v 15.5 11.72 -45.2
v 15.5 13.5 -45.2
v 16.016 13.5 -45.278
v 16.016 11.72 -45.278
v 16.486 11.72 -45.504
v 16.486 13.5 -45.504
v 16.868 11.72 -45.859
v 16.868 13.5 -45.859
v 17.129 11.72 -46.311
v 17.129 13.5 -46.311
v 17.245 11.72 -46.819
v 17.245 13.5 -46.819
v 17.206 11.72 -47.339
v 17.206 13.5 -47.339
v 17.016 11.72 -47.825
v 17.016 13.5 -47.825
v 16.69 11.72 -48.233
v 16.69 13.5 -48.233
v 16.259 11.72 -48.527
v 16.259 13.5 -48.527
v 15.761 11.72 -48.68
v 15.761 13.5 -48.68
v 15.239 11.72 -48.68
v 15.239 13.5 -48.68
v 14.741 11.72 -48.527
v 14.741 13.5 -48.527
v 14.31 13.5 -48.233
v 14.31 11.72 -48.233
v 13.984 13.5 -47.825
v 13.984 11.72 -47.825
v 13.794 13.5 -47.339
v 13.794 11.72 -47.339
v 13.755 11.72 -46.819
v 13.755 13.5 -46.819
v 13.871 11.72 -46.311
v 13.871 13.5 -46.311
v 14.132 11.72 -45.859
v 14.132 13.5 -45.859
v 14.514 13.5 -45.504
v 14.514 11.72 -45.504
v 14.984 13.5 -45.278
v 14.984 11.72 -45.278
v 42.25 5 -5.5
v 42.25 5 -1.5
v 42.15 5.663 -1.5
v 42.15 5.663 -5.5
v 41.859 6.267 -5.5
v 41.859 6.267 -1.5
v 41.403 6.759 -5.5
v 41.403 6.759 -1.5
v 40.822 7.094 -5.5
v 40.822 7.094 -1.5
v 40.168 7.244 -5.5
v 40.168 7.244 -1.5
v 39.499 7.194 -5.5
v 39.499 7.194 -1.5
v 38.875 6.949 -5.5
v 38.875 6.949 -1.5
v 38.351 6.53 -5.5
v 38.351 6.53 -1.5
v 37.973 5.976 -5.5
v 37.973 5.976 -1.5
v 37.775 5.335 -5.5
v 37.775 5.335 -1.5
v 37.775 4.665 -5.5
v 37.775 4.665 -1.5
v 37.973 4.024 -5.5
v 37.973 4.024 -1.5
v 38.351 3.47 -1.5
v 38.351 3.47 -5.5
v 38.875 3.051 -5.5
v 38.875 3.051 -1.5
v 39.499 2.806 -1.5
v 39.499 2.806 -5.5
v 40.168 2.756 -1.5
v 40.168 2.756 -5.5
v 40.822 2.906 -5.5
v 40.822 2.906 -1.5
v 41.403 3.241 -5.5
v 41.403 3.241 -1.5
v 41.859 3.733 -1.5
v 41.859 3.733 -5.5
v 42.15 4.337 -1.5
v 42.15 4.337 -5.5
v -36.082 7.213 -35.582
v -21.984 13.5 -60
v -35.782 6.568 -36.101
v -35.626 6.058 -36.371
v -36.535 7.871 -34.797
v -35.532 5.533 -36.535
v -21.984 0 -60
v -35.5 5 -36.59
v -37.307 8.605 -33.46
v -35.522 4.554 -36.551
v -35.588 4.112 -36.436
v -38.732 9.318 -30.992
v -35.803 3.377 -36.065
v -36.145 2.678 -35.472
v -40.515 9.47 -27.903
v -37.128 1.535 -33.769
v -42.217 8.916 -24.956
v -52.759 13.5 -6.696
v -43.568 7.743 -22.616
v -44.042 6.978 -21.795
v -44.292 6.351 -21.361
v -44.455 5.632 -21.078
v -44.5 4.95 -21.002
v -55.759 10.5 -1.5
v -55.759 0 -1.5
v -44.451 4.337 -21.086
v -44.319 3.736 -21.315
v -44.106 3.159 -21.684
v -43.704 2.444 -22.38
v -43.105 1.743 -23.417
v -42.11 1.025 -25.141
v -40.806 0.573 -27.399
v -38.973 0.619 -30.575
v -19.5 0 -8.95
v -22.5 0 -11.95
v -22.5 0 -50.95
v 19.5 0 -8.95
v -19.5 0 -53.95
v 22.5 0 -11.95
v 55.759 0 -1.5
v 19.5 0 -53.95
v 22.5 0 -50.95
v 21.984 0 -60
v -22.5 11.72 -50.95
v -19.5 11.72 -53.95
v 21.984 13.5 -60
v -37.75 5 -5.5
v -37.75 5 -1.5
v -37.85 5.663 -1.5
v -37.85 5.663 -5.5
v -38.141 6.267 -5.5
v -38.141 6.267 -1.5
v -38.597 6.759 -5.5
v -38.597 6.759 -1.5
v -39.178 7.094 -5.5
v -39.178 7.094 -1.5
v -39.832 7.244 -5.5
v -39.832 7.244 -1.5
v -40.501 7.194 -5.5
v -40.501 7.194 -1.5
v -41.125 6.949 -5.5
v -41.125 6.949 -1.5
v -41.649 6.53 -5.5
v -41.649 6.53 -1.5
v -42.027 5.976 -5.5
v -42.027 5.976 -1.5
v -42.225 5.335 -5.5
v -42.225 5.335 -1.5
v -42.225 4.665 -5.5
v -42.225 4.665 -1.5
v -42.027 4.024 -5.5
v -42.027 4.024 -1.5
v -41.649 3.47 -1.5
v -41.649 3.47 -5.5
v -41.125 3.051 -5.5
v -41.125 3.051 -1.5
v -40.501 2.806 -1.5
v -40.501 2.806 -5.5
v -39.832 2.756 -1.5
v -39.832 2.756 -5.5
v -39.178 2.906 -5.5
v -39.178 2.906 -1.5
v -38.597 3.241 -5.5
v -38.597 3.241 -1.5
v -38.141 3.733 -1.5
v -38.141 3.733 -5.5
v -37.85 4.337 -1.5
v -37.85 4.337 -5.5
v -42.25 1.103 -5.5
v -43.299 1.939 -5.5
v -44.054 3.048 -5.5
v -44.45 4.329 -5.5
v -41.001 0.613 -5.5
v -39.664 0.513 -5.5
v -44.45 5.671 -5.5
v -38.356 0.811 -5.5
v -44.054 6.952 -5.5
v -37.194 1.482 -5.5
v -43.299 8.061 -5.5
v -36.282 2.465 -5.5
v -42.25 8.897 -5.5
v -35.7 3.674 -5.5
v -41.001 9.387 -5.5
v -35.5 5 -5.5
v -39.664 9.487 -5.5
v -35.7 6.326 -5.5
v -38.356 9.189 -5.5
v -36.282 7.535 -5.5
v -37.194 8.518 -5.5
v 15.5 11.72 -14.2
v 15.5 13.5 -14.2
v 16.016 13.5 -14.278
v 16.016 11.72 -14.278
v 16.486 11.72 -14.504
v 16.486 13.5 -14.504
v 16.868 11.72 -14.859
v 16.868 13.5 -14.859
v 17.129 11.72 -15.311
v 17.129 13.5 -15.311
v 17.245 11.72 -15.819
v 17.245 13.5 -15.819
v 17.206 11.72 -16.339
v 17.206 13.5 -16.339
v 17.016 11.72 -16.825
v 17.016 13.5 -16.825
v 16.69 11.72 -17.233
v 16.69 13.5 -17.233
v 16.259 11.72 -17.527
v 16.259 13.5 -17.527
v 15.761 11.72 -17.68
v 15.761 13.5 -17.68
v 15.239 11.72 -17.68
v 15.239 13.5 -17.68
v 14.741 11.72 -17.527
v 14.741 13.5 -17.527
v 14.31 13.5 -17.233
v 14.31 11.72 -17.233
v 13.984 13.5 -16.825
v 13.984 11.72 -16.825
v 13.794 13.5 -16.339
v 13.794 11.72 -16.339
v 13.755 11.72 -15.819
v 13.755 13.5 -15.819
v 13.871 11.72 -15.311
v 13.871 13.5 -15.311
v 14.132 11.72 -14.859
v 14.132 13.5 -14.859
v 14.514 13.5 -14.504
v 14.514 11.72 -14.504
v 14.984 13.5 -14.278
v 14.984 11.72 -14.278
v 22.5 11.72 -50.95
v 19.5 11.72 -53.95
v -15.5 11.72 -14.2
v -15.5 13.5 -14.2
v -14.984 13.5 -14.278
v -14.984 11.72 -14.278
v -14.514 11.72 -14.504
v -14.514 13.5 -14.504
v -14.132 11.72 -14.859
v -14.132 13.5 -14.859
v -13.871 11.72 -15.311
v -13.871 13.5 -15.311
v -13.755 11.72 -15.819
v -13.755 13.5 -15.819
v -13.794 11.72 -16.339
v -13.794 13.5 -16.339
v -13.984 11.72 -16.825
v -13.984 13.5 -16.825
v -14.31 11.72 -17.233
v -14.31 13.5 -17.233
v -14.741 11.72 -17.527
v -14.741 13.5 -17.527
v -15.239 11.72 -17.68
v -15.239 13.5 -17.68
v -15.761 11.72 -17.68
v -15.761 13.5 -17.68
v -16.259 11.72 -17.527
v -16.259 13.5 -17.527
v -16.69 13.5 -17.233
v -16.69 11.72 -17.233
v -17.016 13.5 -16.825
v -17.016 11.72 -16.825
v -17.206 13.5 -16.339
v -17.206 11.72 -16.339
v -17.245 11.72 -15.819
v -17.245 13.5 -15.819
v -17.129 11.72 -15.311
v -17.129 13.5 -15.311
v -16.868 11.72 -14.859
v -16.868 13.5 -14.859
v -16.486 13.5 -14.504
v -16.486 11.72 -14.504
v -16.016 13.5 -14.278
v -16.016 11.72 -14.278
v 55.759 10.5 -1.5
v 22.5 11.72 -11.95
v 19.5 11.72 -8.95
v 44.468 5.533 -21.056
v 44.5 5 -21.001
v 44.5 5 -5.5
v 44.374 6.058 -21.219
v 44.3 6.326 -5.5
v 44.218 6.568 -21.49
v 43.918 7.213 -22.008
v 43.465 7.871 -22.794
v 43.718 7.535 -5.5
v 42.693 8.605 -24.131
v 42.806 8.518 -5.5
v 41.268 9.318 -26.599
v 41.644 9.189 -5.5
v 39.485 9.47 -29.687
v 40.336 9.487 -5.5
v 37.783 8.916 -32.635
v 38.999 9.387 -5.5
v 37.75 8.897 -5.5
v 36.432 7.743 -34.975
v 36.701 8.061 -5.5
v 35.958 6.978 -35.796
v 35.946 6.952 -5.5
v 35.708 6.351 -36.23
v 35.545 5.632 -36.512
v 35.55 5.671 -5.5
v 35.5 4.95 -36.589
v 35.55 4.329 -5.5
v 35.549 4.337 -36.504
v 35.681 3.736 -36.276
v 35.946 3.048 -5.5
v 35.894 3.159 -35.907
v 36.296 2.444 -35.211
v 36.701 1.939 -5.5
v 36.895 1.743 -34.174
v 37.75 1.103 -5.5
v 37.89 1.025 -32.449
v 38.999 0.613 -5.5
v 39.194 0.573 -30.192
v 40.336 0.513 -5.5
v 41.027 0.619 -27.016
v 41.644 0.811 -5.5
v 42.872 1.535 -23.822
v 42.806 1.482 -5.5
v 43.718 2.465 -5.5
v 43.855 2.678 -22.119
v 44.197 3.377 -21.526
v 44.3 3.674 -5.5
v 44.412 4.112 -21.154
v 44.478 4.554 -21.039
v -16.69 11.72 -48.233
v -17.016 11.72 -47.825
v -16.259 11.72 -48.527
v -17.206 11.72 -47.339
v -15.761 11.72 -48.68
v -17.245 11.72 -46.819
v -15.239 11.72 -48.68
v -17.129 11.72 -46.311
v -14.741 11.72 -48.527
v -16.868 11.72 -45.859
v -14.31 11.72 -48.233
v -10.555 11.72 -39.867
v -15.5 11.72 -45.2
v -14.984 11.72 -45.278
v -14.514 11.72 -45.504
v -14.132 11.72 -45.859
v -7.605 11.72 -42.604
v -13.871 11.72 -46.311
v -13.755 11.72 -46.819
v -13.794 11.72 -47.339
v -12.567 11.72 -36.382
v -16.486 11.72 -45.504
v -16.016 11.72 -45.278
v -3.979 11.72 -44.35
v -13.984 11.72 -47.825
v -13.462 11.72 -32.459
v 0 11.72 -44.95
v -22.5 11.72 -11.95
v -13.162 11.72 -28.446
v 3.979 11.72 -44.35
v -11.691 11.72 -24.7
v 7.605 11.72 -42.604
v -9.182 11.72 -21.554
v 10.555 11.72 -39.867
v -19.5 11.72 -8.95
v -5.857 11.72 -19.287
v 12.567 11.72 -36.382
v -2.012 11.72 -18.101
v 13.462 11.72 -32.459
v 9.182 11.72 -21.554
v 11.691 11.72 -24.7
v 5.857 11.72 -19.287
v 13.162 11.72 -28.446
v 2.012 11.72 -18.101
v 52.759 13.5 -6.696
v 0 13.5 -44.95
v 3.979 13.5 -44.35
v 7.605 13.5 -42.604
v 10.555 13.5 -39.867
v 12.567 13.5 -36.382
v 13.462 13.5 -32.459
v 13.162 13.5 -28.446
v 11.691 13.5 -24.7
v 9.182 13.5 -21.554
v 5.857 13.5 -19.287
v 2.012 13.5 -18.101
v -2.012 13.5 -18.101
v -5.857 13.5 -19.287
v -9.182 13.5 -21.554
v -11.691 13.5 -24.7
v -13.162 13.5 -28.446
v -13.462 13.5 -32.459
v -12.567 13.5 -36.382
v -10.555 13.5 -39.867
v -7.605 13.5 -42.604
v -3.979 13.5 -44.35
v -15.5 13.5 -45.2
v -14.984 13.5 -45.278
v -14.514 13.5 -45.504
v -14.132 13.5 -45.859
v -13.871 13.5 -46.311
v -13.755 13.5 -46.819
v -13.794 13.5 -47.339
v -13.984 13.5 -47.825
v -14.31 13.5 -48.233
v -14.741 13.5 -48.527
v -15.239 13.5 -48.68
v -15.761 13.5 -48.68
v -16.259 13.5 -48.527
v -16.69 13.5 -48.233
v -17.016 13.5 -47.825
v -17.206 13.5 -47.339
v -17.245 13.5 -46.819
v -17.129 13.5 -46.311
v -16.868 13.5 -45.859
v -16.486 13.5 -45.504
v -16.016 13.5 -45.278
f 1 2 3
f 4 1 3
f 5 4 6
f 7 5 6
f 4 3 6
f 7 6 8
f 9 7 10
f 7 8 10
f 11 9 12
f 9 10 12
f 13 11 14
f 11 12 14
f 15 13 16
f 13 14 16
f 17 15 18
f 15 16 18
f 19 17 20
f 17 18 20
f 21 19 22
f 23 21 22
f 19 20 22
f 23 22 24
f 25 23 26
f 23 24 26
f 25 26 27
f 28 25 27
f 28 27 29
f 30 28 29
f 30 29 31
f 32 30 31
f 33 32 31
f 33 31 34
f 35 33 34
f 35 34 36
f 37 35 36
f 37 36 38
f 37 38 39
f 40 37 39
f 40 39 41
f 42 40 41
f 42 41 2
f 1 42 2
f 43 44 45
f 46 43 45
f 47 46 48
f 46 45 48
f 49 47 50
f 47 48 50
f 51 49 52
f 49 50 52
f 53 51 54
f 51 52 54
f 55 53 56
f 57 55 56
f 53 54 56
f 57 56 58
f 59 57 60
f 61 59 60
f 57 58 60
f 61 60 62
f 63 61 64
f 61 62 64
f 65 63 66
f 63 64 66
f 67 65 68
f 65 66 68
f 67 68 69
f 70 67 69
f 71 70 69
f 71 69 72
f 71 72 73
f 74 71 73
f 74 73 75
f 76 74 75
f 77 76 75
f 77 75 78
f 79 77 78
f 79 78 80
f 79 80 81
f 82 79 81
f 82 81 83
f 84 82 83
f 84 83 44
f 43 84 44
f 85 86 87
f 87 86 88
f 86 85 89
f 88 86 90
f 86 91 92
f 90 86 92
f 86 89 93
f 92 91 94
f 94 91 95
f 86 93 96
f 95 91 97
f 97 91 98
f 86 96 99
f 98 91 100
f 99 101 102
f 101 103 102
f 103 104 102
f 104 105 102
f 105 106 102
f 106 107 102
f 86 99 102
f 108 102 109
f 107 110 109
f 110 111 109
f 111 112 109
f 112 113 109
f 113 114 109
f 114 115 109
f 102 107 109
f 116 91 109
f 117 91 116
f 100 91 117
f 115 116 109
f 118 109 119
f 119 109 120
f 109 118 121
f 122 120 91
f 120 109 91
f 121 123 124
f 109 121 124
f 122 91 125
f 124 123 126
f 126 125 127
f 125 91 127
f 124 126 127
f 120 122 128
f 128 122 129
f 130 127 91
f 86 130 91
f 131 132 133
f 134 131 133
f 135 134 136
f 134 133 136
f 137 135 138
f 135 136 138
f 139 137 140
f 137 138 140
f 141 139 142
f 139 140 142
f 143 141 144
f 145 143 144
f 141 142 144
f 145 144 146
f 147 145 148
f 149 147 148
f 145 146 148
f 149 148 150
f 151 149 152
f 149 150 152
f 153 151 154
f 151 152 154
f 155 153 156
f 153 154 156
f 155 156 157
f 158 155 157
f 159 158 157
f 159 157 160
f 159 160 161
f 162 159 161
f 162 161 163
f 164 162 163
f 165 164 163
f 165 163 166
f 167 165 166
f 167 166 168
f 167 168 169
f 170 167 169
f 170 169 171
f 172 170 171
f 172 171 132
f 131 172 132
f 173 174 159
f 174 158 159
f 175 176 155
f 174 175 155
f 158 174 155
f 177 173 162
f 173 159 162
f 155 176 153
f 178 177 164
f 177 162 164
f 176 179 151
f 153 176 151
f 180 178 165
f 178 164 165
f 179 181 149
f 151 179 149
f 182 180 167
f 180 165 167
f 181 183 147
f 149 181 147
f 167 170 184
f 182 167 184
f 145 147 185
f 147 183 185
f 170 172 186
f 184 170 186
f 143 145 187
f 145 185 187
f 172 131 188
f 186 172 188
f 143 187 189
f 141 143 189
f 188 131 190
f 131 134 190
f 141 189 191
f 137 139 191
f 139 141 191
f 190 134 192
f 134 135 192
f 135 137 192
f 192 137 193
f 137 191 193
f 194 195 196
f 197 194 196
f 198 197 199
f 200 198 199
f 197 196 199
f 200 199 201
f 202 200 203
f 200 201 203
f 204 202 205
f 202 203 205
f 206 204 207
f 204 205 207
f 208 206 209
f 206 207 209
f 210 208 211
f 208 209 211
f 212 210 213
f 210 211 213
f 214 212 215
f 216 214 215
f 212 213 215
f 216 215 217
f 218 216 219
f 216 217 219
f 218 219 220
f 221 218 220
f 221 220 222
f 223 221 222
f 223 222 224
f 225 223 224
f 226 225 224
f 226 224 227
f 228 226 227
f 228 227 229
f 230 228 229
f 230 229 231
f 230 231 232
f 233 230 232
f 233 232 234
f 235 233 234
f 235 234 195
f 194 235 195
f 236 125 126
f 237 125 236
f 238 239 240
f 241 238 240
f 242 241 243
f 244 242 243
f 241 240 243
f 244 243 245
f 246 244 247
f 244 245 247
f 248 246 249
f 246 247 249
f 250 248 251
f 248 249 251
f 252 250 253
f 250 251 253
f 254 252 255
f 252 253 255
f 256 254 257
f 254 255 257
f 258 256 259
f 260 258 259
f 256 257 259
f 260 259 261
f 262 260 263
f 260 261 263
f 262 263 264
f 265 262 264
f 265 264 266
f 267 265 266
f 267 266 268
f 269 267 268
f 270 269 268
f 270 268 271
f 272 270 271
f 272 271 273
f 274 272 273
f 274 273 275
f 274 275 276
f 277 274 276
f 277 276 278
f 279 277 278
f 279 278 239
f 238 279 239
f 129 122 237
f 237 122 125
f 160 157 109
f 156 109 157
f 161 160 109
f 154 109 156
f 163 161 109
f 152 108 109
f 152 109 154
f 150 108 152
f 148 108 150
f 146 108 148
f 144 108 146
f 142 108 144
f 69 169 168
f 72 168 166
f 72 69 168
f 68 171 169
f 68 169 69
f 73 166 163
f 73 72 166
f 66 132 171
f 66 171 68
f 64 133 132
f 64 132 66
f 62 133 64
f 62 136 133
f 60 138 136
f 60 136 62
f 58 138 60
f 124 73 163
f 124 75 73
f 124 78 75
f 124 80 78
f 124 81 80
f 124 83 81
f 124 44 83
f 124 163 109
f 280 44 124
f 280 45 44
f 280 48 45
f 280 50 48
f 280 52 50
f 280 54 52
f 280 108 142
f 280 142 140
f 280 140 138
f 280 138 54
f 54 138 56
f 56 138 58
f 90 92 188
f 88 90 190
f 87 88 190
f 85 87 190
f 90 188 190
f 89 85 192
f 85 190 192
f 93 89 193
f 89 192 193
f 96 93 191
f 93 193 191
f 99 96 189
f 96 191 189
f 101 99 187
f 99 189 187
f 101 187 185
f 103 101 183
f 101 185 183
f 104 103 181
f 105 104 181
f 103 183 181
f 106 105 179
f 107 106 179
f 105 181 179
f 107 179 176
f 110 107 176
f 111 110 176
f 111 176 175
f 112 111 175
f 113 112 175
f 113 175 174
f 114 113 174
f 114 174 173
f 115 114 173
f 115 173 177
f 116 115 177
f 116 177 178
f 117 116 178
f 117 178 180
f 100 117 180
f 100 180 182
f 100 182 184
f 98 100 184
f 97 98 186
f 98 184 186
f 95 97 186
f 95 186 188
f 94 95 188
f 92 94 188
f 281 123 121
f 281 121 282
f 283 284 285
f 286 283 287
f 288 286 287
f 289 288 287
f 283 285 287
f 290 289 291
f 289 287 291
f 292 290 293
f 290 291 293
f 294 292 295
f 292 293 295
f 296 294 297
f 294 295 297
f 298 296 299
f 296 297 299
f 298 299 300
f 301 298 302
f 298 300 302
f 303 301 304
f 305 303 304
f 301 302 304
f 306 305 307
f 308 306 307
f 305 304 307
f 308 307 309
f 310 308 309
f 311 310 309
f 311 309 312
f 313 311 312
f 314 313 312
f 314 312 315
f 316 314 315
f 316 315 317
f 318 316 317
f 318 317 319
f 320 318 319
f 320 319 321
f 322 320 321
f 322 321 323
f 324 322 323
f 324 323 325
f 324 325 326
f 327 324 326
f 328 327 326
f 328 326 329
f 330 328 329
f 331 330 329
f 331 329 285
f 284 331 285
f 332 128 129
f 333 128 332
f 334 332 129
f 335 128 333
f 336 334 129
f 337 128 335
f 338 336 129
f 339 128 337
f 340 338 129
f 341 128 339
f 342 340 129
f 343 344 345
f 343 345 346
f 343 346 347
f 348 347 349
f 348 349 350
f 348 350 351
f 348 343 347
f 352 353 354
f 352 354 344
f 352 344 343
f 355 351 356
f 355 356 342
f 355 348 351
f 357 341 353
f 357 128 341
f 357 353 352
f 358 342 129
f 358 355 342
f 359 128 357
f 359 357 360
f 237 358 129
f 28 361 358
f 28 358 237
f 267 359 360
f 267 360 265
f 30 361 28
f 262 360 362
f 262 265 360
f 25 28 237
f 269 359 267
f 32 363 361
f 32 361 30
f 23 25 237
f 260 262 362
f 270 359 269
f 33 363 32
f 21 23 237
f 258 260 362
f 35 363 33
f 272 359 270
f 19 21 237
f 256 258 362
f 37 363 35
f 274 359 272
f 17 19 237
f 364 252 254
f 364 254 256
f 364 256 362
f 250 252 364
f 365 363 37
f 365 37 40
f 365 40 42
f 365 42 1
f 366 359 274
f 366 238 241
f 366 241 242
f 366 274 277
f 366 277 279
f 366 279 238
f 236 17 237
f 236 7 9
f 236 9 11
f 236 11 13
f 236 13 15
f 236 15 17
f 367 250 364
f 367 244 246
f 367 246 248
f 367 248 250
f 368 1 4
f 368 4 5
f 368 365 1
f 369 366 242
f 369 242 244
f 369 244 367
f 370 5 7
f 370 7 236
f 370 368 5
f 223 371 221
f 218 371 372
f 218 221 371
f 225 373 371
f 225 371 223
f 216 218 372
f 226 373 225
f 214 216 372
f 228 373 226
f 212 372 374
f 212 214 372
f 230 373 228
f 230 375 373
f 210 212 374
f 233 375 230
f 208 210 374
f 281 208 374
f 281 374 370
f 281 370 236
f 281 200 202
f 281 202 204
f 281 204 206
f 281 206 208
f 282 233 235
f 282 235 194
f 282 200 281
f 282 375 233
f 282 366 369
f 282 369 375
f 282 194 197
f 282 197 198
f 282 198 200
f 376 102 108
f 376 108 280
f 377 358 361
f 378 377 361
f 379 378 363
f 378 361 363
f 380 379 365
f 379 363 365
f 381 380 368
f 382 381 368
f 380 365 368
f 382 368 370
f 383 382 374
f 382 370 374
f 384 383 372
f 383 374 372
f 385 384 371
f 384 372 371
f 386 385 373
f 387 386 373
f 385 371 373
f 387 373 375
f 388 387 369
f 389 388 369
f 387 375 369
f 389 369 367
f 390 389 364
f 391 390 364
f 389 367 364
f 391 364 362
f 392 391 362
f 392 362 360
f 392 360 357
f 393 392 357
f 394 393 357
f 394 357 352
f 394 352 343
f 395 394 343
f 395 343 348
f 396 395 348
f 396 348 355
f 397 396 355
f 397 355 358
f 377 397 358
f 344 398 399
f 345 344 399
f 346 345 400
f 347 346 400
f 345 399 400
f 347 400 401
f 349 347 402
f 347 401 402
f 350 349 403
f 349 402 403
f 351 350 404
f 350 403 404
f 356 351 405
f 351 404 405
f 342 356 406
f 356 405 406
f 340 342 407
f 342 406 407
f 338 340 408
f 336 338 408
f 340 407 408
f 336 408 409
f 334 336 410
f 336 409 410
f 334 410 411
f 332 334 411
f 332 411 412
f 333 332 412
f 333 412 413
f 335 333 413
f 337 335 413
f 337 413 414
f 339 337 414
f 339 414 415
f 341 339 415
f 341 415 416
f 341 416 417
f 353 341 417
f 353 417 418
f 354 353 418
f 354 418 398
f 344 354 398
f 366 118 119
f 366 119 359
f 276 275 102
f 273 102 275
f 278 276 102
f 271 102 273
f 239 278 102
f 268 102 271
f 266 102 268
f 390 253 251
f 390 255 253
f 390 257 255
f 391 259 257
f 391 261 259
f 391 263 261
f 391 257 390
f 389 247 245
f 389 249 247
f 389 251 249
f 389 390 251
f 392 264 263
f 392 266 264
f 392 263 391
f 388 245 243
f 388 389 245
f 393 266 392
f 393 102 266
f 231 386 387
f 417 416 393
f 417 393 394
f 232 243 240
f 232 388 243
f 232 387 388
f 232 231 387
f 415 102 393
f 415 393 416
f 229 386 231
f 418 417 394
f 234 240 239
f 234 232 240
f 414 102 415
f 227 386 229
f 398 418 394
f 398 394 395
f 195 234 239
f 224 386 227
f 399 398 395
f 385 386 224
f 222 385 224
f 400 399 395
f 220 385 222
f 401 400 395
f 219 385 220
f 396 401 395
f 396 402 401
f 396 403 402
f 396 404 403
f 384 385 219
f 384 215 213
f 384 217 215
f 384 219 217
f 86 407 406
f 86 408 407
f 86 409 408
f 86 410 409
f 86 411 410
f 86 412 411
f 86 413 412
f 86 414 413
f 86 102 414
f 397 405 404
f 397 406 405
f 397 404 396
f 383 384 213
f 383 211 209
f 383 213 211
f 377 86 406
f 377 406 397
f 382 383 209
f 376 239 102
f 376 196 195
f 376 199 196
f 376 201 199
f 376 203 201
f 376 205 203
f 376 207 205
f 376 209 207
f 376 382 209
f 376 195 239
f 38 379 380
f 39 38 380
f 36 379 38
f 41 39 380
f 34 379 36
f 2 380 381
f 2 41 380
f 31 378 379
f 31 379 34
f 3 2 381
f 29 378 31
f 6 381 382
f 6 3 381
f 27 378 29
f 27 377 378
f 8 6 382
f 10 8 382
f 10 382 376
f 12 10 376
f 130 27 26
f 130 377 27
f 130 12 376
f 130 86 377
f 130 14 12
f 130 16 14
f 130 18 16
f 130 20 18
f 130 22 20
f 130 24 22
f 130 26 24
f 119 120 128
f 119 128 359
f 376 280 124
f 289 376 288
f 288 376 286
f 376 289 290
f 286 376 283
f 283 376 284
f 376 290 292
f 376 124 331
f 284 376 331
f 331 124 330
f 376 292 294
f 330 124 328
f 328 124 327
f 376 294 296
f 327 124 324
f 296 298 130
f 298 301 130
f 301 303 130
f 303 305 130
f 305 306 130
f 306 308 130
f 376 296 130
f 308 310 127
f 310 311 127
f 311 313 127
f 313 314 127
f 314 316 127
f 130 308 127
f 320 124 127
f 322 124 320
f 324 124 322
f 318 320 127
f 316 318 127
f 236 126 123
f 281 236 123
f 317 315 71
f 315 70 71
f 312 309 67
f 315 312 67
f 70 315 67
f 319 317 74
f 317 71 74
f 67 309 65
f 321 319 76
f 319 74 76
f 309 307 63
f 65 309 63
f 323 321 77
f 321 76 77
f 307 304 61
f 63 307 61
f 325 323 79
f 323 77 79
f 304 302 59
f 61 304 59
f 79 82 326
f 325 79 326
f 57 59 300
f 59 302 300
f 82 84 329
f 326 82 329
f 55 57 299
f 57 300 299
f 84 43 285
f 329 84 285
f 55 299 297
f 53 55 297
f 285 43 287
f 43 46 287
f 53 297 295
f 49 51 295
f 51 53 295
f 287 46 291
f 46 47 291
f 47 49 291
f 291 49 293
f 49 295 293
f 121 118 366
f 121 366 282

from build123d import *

# Parameters (mm, degrees)
BOSS_EXTRUDE1_DEPTH = 13.5
SKETCH2_W           = 45
SKETCH2_H           = 45
CUT_EXTRUDE1_DEPTH  = 11.72
SKETCH3_R           = 13.5
CUT_EXTRUDE2_DEPTH  = 84.329160712
CHAMFER1_SIZE       = 3
SKETCH7_W           = 113.25
SKETCH7_H           = 1.5
CUT_EXTRUDE4_DEPTH  = 84.598089841
CHAMFER2_SIZE       = 3
CHAMFER2_SIZE2      = 5.196152423
SKETCH8_R           = 2.25
CUT_EXTRUDE5_DEPTH  = 82.936336555
CUT_EXTRUDE6_START  = -4
SKETCH9_R           = 4.5
CUT_EXTRUDE6_DEPTH  = 78.936336555
SKETCH5_R           = 1.75
CUT_EXTRUDE7_DEPTH  = 84.013934059


with BuildPart() as part:
    # Sketch1 → Boss-Extrude1 (new body)
    with BuildSketch(Plane(origin=(0, 0, 0), x_dir=(1, 0, 0), z_dir=(0, 1, 0))):
        Polygon((-56.625, 0), (56.625, 0), (21.983983849, 60), (-21.983983849, 60), align=None)
    extrude(amount=BOSS_EXTRUDE1_DEPTH)

    # Sketch2 → Cut-Extrude1 (cut)
    with BuildSketch(Plane.XZ):
        with Locations((0, -31.45)):
            Rectangle(SKETCH2_W, SKETCH2_H)
    extrude(amount=-CUT_EXTRUDE1_DEPTH, mode=Mode.SUBTRACT)

    # Sketch3 → Cut-Extrude2 (cut, through all)
    with BuildSketch(Plane.XZ.offset(-11.72)):
        with Locations(Location((0, -31.45, 0), (0, 0, 270))):
            Circle(SKETCH3_R)
    extrude(amount=-CUT_EXTRUDE2_DEPTH, mode=Mode.SUBTRACT)

    # Chamfer1
    chamfer1_edges = [part.edges().sort_by_distance(p)[0] for p in [
        (-22.5, 5.86, -8.95),
        (-22.5, 5.86, -53.95),
        (22.5, 5.86, -53.95),
        (22.5, 5.86, -8.95),
    ]]
    chamfer(chamfer1_edges, length=CHAMFER1_SIZE)

    # Sketch7 → Cut-Extrude4 (cut, through all)
    with BuildSketch(Plane(origin=(0, 13.5, 0), x_dir=(1, 0, 0), z_dir=(0, 1, 0))):
        with Locations((0, 0.75)):
            Rectangle(SKETCH7_W, SKETCH7_H)
    extrude(amount=-CUT_EXTRUDE4_DEPTH, mode=Mode.SUBTRACT)

    # Chamfer2
    chamfer2_edges = [part.edges().sort_by_distance(p)[0] for p in [
        (0, 13.5, -1.5),
    ]]
    chamfer2_side = [part.faces().sort_by_distance(p)[0] for p in [
        (0, 6.75, -1.5),
    ]]
    chamfer(chamfer2_edges, length=CHAMFER2_SIZE, length2=CHAMFER2_SIZE2, reference=chamfer2_side[0])

    # Sketch8 → Cut-Extrude5 (cut, through all)
    with BuildSketch(Plane.XY.offset(-1.5)):
        with Locations((-40, 5)):
            Circle(SKETCH8_R)
        with Locations((40, 5)):
            Circle(SKETCH8_R)
    extrude(amount=-CUT_EXTRUDE5_DEPTH, mode=Mode.SUBTRACT)

    # Sketch9 → Cut-Extrude6 (cut, through all)
    with BuildSketch(Plane.XY.offset(-1.5).offset(CUT_EXTRUDE6_START)):
        with Locations((-40, 5)):
            Circle(SKETCH9_R)
        with Locations((40, 5)):
            Circle(SKETCH9_R)
    extrude(amount=-CUT_EXTRUDE6_DEPTH, mode=Mode.SUBTRACT)

    # Sketch5 → Cut-Extrude7 (cut, through all)
    with BuildSketch(Plane(origin=(0, 13.5, 0), x_dir=(1, 0, 0), z_dir=(0, 1, 0))):
        with Locations(Location((15.5, 46.95, 0), (0, 0, 270))):
            Circle(SKETCH5_R)
        with Locations(Location((15.5, 15.95, 0), (0, 0, 270))):
            Circle(SKETCH5_R)
        with Locations(Location((-15.5, 15.95, 0), (0, 0, 270))):
            Circle(SKETCH5_R)
        with Locations(Location((-15.5, 46.95, 0), (0, 0, 270))):
            Circle(SKETCH5_R)
    extrude(amount=-CUT_EXTRUDE7_DEPTH, mode=Mode.SUBTRACT)


solid = part.part
